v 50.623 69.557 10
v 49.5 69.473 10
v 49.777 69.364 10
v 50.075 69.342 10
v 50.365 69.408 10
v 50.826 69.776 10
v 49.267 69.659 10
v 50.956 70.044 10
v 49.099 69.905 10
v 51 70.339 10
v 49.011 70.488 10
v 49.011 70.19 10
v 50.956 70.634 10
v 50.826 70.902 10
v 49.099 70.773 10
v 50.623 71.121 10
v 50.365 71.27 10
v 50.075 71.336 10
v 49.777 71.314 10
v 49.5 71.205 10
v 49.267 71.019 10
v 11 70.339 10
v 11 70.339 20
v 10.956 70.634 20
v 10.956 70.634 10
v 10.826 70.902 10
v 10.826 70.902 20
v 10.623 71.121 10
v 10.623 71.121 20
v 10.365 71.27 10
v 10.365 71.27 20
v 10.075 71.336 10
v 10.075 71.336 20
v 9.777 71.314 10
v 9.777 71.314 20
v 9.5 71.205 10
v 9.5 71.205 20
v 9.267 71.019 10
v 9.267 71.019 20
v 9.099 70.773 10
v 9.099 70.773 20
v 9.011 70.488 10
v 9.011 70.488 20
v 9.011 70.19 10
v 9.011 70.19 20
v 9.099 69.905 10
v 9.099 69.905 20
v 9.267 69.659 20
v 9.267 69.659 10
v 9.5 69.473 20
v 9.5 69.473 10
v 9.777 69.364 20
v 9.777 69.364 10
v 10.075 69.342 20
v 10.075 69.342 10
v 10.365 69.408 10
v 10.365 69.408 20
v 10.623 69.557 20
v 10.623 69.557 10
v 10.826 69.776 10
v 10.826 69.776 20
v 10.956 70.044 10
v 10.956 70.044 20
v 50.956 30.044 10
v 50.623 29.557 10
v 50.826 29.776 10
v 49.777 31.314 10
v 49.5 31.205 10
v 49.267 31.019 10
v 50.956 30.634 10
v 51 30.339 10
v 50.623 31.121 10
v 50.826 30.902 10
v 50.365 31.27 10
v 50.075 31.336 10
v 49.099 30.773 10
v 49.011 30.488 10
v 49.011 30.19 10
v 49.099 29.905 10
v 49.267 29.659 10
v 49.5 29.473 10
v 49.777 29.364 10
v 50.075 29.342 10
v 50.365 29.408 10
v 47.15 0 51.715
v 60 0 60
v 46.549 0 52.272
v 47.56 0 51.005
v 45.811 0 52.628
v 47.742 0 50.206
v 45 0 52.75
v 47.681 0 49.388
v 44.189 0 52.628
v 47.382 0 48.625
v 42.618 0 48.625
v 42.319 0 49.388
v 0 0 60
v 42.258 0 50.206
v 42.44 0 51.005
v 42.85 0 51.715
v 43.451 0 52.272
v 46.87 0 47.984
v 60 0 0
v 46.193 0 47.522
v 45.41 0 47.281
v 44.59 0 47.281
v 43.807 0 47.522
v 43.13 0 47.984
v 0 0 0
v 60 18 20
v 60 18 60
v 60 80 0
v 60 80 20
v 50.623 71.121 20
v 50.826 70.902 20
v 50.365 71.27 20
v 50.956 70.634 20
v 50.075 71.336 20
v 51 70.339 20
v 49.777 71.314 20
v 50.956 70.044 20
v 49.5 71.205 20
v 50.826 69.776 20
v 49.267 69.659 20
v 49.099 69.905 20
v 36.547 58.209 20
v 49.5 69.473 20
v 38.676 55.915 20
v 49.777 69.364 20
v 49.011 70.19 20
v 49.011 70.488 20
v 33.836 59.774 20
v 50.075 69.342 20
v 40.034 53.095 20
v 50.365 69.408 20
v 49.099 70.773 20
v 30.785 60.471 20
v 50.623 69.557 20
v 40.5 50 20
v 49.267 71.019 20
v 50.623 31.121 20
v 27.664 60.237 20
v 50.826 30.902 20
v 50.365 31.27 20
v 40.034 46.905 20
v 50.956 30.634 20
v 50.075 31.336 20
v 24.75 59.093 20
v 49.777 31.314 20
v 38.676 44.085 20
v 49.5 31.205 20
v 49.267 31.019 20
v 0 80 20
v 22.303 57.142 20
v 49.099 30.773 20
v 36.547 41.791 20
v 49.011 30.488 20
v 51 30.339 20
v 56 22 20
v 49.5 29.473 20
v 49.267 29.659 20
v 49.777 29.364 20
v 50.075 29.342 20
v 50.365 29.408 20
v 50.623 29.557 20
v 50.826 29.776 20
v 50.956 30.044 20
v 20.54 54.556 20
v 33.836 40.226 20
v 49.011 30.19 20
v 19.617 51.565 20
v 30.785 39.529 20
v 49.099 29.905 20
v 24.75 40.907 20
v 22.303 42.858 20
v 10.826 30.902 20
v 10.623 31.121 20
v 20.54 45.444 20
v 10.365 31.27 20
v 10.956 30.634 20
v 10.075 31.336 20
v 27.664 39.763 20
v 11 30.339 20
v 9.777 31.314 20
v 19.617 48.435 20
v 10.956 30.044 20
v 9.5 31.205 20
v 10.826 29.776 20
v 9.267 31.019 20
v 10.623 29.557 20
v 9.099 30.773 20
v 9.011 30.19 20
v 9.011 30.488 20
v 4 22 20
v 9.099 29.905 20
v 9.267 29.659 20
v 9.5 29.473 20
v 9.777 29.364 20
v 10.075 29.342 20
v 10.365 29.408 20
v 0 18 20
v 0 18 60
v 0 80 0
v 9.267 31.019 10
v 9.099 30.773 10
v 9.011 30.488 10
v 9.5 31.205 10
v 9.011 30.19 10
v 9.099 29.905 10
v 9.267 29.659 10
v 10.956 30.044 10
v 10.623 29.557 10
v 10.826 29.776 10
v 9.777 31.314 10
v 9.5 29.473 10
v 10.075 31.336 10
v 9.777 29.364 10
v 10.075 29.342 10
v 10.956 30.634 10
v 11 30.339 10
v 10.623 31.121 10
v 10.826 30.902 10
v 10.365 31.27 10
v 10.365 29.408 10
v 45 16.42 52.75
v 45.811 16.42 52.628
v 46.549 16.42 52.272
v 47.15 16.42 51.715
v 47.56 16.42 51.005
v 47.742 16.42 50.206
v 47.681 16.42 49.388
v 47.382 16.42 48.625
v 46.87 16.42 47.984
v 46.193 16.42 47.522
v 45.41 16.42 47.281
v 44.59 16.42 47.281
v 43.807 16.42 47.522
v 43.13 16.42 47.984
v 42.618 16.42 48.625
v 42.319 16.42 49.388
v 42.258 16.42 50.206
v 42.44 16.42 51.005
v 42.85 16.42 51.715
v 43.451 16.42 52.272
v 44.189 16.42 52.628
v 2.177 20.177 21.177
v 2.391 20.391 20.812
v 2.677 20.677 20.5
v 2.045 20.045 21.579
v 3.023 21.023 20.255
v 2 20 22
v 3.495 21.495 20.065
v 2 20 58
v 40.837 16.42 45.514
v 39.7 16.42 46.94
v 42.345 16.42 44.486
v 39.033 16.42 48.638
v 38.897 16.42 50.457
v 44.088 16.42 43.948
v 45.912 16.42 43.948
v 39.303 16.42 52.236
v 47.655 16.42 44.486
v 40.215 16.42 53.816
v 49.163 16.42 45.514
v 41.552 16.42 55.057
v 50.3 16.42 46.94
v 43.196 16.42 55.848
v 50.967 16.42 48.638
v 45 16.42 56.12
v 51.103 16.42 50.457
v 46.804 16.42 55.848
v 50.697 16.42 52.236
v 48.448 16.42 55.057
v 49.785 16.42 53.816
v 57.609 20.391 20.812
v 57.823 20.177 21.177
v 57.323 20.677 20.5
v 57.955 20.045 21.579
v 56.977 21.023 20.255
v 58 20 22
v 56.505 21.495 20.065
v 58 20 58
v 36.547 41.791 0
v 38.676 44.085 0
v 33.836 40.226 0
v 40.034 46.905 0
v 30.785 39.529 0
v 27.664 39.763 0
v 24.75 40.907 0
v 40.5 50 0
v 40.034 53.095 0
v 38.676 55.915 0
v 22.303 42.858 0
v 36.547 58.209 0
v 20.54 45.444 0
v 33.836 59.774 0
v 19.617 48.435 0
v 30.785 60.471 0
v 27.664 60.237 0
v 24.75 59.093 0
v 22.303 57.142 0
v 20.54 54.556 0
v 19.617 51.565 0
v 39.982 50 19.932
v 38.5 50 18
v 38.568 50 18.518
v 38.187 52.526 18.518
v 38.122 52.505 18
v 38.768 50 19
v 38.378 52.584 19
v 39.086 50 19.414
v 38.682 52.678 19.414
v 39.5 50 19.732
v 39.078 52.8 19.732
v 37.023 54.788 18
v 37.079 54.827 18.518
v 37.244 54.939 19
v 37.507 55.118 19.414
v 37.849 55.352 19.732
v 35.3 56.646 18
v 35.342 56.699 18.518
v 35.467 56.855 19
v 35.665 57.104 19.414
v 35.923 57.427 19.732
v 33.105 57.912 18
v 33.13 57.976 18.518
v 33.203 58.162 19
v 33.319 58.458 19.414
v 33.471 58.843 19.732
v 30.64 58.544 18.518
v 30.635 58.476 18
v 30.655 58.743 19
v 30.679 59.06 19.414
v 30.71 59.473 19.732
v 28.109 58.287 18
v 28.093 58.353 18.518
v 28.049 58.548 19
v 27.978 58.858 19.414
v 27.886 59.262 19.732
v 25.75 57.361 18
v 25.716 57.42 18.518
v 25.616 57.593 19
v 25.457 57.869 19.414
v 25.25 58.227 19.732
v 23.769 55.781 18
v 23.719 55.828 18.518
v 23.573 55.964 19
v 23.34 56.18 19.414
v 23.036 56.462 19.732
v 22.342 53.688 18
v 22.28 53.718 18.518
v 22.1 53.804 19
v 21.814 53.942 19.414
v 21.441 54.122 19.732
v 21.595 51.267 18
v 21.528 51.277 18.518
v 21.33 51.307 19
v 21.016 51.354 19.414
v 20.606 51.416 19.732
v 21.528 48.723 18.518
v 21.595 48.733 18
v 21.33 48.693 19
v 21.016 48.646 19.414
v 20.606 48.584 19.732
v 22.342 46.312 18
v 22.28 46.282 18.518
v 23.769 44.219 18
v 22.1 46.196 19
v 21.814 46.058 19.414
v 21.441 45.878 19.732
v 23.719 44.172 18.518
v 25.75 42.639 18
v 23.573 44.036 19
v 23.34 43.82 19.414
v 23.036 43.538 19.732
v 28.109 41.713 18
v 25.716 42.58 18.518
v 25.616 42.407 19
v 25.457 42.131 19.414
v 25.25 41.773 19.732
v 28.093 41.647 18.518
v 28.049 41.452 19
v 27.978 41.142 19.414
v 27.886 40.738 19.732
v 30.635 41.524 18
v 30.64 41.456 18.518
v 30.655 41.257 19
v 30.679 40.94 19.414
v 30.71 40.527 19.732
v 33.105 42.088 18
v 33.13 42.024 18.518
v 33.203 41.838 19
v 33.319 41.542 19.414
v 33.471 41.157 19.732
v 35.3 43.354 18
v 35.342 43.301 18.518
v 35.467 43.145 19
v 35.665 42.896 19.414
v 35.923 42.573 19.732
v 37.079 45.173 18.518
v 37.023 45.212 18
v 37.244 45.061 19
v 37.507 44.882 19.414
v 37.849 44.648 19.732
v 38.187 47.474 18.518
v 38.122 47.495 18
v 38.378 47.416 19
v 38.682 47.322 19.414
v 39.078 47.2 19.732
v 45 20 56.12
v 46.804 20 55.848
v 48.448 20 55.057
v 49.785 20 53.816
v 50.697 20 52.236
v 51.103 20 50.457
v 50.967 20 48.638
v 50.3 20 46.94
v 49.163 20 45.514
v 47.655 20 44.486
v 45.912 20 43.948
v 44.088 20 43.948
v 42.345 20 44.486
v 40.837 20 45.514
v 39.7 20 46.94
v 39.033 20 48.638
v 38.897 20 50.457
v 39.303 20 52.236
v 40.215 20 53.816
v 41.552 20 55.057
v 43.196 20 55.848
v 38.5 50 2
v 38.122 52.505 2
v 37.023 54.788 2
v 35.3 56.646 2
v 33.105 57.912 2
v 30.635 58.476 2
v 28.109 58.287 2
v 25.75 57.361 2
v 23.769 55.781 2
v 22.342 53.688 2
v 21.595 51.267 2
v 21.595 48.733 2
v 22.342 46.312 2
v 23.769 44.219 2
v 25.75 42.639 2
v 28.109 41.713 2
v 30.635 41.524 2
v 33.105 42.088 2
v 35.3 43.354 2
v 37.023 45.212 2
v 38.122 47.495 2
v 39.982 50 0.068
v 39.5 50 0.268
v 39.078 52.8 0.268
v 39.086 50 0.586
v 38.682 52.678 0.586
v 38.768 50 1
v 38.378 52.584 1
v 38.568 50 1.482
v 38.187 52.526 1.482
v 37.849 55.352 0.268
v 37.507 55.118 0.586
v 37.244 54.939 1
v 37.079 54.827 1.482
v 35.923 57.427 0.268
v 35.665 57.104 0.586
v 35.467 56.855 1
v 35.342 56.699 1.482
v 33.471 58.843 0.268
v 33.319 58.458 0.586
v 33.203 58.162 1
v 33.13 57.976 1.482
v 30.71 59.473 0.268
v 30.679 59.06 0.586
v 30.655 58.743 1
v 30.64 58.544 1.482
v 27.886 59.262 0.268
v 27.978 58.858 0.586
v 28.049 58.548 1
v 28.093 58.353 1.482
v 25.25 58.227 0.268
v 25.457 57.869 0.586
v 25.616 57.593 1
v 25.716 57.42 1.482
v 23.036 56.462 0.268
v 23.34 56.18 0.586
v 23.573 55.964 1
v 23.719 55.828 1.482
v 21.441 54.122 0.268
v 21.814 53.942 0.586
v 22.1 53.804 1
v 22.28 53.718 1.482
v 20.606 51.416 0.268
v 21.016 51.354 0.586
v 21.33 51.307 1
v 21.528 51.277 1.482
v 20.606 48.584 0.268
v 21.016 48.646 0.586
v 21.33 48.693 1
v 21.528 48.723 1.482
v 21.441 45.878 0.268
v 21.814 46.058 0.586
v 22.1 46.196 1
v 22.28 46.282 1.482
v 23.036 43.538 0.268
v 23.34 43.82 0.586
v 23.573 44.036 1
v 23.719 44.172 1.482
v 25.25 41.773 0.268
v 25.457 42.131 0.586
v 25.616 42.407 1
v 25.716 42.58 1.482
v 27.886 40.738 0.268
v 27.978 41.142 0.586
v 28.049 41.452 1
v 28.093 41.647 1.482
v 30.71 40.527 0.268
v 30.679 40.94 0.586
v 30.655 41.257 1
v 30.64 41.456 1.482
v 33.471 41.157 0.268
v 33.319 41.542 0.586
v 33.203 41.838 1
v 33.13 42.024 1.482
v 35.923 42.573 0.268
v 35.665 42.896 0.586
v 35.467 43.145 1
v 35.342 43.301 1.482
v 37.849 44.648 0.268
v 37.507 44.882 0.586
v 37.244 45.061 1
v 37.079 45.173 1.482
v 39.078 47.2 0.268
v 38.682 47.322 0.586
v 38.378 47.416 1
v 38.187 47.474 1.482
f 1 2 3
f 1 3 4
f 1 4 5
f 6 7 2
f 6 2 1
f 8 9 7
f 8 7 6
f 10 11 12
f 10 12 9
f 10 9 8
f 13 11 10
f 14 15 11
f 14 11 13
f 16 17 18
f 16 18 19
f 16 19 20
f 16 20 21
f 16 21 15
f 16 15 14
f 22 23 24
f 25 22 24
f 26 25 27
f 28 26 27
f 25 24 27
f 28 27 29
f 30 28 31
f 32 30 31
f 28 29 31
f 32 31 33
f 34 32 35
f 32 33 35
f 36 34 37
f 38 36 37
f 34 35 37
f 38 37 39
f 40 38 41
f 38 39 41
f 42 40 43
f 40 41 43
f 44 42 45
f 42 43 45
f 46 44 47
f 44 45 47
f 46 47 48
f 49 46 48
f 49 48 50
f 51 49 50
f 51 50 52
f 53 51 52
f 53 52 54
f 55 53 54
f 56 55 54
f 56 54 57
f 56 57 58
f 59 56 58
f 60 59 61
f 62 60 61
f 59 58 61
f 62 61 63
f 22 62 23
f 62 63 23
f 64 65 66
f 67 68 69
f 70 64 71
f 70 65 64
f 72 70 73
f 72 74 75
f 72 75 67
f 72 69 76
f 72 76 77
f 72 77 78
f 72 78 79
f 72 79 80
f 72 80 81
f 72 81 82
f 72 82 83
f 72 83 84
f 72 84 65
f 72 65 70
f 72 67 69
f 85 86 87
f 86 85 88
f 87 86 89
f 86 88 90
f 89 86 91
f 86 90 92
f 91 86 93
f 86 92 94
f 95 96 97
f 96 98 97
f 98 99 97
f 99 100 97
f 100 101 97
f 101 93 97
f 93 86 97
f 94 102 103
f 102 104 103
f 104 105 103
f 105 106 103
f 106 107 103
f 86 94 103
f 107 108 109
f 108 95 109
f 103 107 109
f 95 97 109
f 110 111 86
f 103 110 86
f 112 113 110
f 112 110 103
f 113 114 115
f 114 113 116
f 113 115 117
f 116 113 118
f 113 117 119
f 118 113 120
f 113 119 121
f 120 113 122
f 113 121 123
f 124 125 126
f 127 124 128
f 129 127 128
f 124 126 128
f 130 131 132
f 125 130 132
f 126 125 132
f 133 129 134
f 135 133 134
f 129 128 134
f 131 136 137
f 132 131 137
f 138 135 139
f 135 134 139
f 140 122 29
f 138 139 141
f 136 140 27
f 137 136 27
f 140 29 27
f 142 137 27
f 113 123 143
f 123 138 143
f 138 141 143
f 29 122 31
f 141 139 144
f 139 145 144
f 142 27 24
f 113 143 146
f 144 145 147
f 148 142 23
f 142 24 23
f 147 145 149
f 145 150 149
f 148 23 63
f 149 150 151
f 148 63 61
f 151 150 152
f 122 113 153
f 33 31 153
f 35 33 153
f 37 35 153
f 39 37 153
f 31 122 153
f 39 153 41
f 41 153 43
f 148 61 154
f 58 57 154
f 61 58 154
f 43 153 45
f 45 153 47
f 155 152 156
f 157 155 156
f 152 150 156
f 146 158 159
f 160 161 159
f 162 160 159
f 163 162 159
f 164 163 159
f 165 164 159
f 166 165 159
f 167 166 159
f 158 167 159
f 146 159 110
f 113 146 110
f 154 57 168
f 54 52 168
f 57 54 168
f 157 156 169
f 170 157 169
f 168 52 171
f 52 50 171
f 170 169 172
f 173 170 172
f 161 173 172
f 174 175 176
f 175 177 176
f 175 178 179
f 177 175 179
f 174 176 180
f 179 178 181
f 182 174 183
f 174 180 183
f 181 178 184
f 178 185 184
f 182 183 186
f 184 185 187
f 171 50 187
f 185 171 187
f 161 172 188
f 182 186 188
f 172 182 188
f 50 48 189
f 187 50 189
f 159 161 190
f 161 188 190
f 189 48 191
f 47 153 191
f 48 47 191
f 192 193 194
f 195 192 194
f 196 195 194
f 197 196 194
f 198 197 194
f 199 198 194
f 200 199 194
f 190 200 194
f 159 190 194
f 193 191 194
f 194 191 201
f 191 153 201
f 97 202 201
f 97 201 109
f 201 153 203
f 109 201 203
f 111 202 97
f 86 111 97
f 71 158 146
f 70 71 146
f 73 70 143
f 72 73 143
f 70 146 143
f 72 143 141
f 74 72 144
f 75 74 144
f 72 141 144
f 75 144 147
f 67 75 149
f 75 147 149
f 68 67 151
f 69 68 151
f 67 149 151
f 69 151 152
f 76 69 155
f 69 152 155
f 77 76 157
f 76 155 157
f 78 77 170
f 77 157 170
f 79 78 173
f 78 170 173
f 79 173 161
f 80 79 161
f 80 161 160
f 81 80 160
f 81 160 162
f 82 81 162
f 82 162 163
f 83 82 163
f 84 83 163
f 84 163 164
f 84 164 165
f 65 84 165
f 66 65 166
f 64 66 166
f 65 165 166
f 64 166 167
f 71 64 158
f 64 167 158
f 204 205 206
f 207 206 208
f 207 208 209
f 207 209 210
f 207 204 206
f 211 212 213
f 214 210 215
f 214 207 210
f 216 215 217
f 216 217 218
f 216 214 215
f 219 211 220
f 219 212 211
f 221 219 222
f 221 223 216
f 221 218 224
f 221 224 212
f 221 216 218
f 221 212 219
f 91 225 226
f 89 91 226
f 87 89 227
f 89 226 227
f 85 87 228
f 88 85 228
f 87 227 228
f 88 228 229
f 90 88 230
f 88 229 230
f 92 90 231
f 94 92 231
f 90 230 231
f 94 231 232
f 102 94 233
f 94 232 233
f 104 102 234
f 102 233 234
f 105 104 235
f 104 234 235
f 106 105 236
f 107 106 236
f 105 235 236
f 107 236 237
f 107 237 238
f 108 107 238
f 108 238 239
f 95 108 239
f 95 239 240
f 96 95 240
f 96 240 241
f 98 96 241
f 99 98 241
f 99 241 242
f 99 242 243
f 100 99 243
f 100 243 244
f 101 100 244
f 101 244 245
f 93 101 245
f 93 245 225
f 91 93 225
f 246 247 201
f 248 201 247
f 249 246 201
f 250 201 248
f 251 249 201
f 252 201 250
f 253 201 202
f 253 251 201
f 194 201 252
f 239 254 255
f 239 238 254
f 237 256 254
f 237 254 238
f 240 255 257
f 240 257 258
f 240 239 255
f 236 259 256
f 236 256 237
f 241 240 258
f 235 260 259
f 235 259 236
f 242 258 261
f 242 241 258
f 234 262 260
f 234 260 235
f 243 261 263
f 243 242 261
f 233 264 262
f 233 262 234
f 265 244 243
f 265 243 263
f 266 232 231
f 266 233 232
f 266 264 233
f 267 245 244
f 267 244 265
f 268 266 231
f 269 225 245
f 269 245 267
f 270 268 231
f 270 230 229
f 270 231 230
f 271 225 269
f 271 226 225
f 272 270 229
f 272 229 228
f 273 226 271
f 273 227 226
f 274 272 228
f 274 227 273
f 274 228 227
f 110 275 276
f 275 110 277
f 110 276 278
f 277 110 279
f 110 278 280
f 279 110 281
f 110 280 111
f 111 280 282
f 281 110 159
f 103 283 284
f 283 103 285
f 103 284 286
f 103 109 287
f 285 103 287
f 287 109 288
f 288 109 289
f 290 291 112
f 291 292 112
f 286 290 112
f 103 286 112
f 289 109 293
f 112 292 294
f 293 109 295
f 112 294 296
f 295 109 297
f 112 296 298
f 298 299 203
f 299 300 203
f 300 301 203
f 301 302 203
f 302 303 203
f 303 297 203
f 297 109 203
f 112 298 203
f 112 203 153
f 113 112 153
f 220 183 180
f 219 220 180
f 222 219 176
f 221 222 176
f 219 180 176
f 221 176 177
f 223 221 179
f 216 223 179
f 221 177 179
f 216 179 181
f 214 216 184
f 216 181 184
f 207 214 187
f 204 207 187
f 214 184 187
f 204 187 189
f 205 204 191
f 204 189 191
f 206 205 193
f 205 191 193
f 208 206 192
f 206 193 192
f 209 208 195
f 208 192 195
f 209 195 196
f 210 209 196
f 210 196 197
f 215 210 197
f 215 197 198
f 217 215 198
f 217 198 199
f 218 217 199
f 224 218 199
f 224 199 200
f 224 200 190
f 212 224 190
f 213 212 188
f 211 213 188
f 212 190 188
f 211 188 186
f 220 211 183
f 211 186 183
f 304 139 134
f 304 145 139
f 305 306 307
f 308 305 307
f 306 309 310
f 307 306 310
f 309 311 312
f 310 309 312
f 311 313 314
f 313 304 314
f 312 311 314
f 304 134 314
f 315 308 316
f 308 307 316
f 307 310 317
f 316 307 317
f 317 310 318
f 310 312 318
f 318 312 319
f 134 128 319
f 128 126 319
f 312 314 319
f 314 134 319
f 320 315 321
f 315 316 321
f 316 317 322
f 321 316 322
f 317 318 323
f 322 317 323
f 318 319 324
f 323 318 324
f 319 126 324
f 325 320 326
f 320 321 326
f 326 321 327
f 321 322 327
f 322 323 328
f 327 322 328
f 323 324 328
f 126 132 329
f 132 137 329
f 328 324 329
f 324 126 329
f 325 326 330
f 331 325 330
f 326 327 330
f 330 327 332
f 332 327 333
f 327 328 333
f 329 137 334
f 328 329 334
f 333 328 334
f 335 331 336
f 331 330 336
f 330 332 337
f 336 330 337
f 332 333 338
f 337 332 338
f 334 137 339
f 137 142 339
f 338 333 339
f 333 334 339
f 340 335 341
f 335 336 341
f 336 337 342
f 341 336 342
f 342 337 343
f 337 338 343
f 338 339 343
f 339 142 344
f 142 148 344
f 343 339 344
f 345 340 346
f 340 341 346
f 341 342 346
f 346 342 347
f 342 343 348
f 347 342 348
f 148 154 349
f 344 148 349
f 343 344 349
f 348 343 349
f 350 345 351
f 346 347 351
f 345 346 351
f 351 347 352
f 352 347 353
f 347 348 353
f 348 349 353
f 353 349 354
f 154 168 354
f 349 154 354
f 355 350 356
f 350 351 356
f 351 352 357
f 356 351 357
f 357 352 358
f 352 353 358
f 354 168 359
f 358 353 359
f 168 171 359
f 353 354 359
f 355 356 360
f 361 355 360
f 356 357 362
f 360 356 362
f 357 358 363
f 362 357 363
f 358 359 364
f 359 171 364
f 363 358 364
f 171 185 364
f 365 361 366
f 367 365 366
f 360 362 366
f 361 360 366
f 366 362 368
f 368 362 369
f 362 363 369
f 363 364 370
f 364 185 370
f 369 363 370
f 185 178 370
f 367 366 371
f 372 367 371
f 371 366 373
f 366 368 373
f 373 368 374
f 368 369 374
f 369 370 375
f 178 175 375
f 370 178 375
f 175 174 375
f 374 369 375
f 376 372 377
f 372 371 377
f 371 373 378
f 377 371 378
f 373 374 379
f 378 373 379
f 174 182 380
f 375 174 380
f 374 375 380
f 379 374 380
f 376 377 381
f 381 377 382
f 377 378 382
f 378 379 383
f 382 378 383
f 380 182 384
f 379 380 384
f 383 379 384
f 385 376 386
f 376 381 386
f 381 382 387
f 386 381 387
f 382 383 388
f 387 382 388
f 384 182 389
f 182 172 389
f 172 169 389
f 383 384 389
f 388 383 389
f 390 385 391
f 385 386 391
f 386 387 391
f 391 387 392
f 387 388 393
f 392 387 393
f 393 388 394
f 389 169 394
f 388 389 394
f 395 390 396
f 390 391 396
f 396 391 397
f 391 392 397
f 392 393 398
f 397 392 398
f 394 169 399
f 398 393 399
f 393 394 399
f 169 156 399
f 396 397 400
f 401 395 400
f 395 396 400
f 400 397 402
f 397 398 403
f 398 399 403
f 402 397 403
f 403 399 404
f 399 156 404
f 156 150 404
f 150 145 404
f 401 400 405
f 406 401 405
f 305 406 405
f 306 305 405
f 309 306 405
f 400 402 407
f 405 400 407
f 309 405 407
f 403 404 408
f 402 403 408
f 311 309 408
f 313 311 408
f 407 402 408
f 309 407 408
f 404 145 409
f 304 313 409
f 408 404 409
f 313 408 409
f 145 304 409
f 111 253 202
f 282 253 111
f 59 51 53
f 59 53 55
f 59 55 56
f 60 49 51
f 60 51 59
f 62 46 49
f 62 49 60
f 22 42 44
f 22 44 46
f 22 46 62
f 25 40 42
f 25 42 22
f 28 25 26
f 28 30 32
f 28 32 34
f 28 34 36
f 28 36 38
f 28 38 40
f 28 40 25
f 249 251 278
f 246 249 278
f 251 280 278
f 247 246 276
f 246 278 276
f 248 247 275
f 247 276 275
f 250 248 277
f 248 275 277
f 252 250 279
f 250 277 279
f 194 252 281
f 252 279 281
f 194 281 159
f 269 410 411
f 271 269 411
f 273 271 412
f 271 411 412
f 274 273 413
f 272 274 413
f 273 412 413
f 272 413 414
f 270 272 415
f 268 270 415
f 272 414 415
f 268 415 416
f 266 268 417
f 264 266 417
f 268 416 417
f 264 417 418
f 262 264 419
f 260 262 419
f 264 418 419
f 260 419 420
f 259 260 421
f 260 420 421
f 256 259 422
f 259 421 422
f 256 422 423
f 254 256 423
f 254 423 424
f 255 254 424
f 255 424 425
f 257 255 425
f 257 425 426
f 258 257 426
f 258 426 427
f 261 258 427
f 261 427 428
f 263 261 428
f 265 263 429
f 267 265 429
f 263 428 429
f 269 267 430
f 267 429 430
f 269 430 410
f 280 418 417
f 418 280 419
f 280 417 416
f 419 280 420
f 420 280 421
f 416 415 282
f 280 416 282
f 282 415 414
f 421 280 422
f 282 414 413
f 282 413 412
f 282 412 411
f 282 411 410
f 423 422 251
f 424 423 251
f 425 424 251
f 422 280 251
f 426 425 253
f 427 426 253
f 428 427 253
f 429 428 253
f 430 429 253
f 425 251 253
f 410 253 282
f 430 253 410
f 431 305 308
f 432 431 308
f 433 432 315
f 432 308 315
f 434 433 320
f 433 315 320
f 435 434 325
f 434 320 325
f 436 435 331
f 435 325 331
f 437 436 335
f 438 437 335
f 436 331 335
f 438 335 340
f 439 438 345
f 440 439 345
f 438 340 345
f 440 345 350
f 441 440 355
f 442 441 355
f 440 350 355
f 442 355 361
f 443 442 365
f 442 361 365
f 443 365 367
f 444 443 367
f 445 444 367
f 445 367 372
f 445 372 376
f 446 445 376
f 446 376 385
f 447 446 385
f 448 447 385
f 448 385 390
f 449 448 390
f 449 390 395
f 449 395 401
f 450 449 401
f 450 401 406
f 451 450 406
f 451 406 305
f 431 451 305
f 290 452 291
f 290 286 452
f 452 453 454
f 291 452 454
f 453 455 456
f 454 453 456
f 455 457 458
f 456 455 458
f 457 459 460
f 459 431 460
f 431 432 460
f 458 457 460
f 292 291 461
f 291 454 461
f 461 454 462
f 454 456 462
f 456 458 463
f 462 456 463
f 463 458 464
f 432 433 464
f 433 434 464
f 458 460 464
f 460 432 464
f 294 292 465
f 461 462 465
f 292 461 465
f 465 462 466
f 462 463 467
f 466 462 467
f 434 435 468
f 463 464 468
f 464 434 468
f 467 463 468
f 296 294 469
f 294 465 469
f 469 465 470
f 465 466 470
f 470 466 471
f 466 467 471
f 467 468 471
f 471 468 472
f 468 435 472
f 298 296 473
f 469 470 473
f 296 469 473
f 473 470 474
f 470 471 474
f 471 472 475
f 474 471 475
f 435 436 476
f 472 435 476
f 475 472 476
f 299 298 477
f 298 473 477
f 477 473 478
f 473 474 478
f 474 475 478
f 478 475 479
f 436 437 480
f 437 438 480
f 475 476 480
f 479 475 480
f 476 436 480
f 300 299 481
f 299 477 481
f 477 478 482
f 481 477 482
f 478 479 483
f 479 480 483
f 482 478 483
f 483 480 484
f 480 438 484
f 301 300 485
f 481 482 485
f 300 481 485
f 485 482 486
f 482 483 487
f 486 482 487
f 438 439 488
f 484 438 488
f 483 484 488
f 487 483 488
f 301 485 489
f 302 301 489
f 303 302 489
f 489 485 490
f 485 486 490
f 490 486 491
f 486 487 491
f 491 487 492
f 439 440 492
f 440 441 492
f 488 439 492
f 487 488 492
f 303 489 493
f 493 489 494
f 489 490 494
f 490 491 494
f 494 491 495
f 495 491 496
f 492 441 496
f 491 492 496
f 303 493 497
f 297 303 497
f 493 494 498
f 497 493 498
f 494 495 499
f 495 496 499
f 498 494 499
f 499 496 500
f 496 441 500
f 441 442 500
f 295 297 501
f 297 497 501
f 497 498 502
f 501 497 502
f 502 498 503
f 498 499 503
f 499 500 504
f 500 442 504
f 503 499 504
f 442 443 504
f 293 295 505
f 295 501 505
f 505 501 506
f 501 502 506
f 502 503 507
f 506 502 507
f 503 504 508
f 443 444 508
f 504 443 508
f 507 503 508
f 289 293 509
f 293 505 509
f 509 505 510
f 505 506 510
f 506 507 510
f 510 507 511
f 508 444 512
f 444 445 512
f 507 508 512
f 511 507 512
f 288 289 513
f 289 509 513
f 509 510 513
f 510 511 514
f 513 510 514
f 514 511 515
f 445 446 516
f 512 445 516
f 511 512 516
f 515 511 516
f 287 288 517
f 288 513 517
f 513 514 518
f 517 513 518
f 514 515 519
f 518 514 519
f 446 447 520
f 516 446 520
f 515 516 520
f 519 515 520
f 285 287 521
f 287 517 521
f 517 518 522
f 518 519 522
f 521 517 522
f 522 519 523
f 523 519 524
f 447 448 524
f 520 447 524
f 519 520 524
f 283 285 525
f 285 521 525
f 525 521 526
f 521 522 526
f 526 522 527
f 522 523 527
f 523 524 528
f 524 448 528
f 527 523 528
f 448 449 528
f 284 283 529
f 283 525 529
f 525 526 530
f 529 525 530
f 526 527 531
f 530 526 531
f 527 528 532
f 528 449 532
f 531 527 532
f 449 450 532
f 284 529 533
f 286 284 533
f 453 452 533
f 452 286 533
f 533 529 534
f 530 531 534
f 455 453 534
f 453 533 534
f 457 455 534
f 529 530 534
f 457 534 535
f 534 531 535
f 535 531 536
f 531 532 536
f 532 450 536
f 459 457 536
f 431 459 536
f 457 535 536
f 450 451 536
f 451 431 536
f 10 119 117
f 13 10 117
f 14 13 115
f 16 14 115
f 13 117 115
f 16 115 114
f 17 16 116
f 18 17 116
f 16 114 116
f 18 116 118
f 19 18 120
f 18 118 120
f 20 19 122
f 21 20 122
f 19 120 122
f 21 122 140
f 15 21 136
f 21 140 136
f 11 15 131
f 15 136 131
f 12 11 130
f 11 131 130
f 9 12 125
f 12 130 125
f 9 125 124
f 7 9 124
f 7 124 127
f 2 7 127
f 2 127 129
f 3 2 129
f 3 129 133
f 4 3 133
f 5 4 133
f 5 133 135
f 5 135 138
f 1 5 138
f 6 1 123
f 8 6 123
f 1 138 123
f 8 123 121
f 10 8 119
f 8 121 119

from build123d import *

# Parameters (mm, degrees)
BOSS_EXTRUDE1_DEPTH = 60
SKETCH2_R           = 8.5
CUT_EXTRUDE1_DEPTH  = 108.703296143
FILLET1_R           = 2
SKETCH3_R           = 1
CUT_EXTRUDE2_DEPTH  = 10
SKETCH5_R           = 6.12
CUT_EXTRUDE3_DEPTH  = 3.58
SKETCH6_R           = 2.75
CUT_EXTRUDE4_DEPTH  = 107.030261718
CHAMFER1_SIZE       = 2
FILLET2_R           = 2


with BuildPart() as part:
    # Sketch1 → Boss-Extrude1 (new body)
    with BuildSketch(Plane(origin=(0, 0, 0), x_dir=(0, 0, -1), z_dir=(1, 0, 0))):
        Polygon((0, 0), (0, 80), (-20, 80), (-20, 20), (-60, 20), (-60, 0), align=None)
    extrude(amount=BOSS_EXTRUDE1_DEPTH)

    # Sketch2 → Cut-Extrude1 (cut, through all)
    with BuildSketch(Plane.XY.offset(20)):
        with Locations((30, 50)):
            Circle(SKETCH2_R)
    extrude(amount=-CUT_EXTRUDE1_DEPTH, mode=Mode.SUBTRACT)

    # Fillet1
    fillet1_edges = [part.edges().sort_by_distance(p)[0] for p in [
        (21.5, 50, 0),
        (21.5, 50, 20),
    ]]
    fillet(fillet1_edges, radius=FILLET1_R)

    # Sketch3 → Cut-Extrude2 (cut)
    with BuildSketch(Plane.XY.offset(20)):
        with Locations((10, 70.338969999)):
            Circle(SKETCH3_R)
        with Locations((50, 70.338969999)):
            Circle(SKETCH3_R)
        with Locations((50, 30.338969999)):
            Circle(SKETCH3_R)
        with Locations((10, 30.338969999)):
            Circle(SKETCH3_R)
    extrude(amount=-CUT_EXTRUDE2_DEPTH, mode=Mode.SUBTRACT)

    # Sketch5 → Cut-Extrude3 (cut)
    with BuildSketch(Plane(origin=(0, 20, 0), x_dir=(1, 0, 0), z_dir=(0, 1, 0))):
        with Locations(Location((45, -50, 0), (0, 0, 270))):
            Circle(SKETCH5_R)
    extrude(amount=-CUT_EXTRUDE3_DEPTH, mode=Mode.SUBTRACT)

    # Sketch6 → Cut-Extrude4 (cut, through all)
    with BuildSketch(Plane(origin=(0, 16.42, 0), x_dir=(1, 0, 0), z_dir=(0, 1, 0))):
        with Locations(Location((45, -50, 0), (0, 0, 270))):
            Circle(SKETCH6_R)
    extrude(amount=-CUT_EXTRUDE4_DEPTH, mode=Mode.SUBTRACT)

    # Chamfer1
    chamfer1_edges = [part.edges().sort_by_distance(p)[0] for p in [
        (30, 20, 60),
        (60, 20, 40),
        (0, 20, 40),
    ]]
    chamfer(chamfer1_edges, length=CHAMFER1_SIZE)

    # Fillet2
    fillet2_edges = [part.edges().sort_by_distance(p)[0] for p in [
        (30, 20, 20),
    ]]
    fillet(fillet2_edges, radius=FILLET2_R)


solid = part.part
